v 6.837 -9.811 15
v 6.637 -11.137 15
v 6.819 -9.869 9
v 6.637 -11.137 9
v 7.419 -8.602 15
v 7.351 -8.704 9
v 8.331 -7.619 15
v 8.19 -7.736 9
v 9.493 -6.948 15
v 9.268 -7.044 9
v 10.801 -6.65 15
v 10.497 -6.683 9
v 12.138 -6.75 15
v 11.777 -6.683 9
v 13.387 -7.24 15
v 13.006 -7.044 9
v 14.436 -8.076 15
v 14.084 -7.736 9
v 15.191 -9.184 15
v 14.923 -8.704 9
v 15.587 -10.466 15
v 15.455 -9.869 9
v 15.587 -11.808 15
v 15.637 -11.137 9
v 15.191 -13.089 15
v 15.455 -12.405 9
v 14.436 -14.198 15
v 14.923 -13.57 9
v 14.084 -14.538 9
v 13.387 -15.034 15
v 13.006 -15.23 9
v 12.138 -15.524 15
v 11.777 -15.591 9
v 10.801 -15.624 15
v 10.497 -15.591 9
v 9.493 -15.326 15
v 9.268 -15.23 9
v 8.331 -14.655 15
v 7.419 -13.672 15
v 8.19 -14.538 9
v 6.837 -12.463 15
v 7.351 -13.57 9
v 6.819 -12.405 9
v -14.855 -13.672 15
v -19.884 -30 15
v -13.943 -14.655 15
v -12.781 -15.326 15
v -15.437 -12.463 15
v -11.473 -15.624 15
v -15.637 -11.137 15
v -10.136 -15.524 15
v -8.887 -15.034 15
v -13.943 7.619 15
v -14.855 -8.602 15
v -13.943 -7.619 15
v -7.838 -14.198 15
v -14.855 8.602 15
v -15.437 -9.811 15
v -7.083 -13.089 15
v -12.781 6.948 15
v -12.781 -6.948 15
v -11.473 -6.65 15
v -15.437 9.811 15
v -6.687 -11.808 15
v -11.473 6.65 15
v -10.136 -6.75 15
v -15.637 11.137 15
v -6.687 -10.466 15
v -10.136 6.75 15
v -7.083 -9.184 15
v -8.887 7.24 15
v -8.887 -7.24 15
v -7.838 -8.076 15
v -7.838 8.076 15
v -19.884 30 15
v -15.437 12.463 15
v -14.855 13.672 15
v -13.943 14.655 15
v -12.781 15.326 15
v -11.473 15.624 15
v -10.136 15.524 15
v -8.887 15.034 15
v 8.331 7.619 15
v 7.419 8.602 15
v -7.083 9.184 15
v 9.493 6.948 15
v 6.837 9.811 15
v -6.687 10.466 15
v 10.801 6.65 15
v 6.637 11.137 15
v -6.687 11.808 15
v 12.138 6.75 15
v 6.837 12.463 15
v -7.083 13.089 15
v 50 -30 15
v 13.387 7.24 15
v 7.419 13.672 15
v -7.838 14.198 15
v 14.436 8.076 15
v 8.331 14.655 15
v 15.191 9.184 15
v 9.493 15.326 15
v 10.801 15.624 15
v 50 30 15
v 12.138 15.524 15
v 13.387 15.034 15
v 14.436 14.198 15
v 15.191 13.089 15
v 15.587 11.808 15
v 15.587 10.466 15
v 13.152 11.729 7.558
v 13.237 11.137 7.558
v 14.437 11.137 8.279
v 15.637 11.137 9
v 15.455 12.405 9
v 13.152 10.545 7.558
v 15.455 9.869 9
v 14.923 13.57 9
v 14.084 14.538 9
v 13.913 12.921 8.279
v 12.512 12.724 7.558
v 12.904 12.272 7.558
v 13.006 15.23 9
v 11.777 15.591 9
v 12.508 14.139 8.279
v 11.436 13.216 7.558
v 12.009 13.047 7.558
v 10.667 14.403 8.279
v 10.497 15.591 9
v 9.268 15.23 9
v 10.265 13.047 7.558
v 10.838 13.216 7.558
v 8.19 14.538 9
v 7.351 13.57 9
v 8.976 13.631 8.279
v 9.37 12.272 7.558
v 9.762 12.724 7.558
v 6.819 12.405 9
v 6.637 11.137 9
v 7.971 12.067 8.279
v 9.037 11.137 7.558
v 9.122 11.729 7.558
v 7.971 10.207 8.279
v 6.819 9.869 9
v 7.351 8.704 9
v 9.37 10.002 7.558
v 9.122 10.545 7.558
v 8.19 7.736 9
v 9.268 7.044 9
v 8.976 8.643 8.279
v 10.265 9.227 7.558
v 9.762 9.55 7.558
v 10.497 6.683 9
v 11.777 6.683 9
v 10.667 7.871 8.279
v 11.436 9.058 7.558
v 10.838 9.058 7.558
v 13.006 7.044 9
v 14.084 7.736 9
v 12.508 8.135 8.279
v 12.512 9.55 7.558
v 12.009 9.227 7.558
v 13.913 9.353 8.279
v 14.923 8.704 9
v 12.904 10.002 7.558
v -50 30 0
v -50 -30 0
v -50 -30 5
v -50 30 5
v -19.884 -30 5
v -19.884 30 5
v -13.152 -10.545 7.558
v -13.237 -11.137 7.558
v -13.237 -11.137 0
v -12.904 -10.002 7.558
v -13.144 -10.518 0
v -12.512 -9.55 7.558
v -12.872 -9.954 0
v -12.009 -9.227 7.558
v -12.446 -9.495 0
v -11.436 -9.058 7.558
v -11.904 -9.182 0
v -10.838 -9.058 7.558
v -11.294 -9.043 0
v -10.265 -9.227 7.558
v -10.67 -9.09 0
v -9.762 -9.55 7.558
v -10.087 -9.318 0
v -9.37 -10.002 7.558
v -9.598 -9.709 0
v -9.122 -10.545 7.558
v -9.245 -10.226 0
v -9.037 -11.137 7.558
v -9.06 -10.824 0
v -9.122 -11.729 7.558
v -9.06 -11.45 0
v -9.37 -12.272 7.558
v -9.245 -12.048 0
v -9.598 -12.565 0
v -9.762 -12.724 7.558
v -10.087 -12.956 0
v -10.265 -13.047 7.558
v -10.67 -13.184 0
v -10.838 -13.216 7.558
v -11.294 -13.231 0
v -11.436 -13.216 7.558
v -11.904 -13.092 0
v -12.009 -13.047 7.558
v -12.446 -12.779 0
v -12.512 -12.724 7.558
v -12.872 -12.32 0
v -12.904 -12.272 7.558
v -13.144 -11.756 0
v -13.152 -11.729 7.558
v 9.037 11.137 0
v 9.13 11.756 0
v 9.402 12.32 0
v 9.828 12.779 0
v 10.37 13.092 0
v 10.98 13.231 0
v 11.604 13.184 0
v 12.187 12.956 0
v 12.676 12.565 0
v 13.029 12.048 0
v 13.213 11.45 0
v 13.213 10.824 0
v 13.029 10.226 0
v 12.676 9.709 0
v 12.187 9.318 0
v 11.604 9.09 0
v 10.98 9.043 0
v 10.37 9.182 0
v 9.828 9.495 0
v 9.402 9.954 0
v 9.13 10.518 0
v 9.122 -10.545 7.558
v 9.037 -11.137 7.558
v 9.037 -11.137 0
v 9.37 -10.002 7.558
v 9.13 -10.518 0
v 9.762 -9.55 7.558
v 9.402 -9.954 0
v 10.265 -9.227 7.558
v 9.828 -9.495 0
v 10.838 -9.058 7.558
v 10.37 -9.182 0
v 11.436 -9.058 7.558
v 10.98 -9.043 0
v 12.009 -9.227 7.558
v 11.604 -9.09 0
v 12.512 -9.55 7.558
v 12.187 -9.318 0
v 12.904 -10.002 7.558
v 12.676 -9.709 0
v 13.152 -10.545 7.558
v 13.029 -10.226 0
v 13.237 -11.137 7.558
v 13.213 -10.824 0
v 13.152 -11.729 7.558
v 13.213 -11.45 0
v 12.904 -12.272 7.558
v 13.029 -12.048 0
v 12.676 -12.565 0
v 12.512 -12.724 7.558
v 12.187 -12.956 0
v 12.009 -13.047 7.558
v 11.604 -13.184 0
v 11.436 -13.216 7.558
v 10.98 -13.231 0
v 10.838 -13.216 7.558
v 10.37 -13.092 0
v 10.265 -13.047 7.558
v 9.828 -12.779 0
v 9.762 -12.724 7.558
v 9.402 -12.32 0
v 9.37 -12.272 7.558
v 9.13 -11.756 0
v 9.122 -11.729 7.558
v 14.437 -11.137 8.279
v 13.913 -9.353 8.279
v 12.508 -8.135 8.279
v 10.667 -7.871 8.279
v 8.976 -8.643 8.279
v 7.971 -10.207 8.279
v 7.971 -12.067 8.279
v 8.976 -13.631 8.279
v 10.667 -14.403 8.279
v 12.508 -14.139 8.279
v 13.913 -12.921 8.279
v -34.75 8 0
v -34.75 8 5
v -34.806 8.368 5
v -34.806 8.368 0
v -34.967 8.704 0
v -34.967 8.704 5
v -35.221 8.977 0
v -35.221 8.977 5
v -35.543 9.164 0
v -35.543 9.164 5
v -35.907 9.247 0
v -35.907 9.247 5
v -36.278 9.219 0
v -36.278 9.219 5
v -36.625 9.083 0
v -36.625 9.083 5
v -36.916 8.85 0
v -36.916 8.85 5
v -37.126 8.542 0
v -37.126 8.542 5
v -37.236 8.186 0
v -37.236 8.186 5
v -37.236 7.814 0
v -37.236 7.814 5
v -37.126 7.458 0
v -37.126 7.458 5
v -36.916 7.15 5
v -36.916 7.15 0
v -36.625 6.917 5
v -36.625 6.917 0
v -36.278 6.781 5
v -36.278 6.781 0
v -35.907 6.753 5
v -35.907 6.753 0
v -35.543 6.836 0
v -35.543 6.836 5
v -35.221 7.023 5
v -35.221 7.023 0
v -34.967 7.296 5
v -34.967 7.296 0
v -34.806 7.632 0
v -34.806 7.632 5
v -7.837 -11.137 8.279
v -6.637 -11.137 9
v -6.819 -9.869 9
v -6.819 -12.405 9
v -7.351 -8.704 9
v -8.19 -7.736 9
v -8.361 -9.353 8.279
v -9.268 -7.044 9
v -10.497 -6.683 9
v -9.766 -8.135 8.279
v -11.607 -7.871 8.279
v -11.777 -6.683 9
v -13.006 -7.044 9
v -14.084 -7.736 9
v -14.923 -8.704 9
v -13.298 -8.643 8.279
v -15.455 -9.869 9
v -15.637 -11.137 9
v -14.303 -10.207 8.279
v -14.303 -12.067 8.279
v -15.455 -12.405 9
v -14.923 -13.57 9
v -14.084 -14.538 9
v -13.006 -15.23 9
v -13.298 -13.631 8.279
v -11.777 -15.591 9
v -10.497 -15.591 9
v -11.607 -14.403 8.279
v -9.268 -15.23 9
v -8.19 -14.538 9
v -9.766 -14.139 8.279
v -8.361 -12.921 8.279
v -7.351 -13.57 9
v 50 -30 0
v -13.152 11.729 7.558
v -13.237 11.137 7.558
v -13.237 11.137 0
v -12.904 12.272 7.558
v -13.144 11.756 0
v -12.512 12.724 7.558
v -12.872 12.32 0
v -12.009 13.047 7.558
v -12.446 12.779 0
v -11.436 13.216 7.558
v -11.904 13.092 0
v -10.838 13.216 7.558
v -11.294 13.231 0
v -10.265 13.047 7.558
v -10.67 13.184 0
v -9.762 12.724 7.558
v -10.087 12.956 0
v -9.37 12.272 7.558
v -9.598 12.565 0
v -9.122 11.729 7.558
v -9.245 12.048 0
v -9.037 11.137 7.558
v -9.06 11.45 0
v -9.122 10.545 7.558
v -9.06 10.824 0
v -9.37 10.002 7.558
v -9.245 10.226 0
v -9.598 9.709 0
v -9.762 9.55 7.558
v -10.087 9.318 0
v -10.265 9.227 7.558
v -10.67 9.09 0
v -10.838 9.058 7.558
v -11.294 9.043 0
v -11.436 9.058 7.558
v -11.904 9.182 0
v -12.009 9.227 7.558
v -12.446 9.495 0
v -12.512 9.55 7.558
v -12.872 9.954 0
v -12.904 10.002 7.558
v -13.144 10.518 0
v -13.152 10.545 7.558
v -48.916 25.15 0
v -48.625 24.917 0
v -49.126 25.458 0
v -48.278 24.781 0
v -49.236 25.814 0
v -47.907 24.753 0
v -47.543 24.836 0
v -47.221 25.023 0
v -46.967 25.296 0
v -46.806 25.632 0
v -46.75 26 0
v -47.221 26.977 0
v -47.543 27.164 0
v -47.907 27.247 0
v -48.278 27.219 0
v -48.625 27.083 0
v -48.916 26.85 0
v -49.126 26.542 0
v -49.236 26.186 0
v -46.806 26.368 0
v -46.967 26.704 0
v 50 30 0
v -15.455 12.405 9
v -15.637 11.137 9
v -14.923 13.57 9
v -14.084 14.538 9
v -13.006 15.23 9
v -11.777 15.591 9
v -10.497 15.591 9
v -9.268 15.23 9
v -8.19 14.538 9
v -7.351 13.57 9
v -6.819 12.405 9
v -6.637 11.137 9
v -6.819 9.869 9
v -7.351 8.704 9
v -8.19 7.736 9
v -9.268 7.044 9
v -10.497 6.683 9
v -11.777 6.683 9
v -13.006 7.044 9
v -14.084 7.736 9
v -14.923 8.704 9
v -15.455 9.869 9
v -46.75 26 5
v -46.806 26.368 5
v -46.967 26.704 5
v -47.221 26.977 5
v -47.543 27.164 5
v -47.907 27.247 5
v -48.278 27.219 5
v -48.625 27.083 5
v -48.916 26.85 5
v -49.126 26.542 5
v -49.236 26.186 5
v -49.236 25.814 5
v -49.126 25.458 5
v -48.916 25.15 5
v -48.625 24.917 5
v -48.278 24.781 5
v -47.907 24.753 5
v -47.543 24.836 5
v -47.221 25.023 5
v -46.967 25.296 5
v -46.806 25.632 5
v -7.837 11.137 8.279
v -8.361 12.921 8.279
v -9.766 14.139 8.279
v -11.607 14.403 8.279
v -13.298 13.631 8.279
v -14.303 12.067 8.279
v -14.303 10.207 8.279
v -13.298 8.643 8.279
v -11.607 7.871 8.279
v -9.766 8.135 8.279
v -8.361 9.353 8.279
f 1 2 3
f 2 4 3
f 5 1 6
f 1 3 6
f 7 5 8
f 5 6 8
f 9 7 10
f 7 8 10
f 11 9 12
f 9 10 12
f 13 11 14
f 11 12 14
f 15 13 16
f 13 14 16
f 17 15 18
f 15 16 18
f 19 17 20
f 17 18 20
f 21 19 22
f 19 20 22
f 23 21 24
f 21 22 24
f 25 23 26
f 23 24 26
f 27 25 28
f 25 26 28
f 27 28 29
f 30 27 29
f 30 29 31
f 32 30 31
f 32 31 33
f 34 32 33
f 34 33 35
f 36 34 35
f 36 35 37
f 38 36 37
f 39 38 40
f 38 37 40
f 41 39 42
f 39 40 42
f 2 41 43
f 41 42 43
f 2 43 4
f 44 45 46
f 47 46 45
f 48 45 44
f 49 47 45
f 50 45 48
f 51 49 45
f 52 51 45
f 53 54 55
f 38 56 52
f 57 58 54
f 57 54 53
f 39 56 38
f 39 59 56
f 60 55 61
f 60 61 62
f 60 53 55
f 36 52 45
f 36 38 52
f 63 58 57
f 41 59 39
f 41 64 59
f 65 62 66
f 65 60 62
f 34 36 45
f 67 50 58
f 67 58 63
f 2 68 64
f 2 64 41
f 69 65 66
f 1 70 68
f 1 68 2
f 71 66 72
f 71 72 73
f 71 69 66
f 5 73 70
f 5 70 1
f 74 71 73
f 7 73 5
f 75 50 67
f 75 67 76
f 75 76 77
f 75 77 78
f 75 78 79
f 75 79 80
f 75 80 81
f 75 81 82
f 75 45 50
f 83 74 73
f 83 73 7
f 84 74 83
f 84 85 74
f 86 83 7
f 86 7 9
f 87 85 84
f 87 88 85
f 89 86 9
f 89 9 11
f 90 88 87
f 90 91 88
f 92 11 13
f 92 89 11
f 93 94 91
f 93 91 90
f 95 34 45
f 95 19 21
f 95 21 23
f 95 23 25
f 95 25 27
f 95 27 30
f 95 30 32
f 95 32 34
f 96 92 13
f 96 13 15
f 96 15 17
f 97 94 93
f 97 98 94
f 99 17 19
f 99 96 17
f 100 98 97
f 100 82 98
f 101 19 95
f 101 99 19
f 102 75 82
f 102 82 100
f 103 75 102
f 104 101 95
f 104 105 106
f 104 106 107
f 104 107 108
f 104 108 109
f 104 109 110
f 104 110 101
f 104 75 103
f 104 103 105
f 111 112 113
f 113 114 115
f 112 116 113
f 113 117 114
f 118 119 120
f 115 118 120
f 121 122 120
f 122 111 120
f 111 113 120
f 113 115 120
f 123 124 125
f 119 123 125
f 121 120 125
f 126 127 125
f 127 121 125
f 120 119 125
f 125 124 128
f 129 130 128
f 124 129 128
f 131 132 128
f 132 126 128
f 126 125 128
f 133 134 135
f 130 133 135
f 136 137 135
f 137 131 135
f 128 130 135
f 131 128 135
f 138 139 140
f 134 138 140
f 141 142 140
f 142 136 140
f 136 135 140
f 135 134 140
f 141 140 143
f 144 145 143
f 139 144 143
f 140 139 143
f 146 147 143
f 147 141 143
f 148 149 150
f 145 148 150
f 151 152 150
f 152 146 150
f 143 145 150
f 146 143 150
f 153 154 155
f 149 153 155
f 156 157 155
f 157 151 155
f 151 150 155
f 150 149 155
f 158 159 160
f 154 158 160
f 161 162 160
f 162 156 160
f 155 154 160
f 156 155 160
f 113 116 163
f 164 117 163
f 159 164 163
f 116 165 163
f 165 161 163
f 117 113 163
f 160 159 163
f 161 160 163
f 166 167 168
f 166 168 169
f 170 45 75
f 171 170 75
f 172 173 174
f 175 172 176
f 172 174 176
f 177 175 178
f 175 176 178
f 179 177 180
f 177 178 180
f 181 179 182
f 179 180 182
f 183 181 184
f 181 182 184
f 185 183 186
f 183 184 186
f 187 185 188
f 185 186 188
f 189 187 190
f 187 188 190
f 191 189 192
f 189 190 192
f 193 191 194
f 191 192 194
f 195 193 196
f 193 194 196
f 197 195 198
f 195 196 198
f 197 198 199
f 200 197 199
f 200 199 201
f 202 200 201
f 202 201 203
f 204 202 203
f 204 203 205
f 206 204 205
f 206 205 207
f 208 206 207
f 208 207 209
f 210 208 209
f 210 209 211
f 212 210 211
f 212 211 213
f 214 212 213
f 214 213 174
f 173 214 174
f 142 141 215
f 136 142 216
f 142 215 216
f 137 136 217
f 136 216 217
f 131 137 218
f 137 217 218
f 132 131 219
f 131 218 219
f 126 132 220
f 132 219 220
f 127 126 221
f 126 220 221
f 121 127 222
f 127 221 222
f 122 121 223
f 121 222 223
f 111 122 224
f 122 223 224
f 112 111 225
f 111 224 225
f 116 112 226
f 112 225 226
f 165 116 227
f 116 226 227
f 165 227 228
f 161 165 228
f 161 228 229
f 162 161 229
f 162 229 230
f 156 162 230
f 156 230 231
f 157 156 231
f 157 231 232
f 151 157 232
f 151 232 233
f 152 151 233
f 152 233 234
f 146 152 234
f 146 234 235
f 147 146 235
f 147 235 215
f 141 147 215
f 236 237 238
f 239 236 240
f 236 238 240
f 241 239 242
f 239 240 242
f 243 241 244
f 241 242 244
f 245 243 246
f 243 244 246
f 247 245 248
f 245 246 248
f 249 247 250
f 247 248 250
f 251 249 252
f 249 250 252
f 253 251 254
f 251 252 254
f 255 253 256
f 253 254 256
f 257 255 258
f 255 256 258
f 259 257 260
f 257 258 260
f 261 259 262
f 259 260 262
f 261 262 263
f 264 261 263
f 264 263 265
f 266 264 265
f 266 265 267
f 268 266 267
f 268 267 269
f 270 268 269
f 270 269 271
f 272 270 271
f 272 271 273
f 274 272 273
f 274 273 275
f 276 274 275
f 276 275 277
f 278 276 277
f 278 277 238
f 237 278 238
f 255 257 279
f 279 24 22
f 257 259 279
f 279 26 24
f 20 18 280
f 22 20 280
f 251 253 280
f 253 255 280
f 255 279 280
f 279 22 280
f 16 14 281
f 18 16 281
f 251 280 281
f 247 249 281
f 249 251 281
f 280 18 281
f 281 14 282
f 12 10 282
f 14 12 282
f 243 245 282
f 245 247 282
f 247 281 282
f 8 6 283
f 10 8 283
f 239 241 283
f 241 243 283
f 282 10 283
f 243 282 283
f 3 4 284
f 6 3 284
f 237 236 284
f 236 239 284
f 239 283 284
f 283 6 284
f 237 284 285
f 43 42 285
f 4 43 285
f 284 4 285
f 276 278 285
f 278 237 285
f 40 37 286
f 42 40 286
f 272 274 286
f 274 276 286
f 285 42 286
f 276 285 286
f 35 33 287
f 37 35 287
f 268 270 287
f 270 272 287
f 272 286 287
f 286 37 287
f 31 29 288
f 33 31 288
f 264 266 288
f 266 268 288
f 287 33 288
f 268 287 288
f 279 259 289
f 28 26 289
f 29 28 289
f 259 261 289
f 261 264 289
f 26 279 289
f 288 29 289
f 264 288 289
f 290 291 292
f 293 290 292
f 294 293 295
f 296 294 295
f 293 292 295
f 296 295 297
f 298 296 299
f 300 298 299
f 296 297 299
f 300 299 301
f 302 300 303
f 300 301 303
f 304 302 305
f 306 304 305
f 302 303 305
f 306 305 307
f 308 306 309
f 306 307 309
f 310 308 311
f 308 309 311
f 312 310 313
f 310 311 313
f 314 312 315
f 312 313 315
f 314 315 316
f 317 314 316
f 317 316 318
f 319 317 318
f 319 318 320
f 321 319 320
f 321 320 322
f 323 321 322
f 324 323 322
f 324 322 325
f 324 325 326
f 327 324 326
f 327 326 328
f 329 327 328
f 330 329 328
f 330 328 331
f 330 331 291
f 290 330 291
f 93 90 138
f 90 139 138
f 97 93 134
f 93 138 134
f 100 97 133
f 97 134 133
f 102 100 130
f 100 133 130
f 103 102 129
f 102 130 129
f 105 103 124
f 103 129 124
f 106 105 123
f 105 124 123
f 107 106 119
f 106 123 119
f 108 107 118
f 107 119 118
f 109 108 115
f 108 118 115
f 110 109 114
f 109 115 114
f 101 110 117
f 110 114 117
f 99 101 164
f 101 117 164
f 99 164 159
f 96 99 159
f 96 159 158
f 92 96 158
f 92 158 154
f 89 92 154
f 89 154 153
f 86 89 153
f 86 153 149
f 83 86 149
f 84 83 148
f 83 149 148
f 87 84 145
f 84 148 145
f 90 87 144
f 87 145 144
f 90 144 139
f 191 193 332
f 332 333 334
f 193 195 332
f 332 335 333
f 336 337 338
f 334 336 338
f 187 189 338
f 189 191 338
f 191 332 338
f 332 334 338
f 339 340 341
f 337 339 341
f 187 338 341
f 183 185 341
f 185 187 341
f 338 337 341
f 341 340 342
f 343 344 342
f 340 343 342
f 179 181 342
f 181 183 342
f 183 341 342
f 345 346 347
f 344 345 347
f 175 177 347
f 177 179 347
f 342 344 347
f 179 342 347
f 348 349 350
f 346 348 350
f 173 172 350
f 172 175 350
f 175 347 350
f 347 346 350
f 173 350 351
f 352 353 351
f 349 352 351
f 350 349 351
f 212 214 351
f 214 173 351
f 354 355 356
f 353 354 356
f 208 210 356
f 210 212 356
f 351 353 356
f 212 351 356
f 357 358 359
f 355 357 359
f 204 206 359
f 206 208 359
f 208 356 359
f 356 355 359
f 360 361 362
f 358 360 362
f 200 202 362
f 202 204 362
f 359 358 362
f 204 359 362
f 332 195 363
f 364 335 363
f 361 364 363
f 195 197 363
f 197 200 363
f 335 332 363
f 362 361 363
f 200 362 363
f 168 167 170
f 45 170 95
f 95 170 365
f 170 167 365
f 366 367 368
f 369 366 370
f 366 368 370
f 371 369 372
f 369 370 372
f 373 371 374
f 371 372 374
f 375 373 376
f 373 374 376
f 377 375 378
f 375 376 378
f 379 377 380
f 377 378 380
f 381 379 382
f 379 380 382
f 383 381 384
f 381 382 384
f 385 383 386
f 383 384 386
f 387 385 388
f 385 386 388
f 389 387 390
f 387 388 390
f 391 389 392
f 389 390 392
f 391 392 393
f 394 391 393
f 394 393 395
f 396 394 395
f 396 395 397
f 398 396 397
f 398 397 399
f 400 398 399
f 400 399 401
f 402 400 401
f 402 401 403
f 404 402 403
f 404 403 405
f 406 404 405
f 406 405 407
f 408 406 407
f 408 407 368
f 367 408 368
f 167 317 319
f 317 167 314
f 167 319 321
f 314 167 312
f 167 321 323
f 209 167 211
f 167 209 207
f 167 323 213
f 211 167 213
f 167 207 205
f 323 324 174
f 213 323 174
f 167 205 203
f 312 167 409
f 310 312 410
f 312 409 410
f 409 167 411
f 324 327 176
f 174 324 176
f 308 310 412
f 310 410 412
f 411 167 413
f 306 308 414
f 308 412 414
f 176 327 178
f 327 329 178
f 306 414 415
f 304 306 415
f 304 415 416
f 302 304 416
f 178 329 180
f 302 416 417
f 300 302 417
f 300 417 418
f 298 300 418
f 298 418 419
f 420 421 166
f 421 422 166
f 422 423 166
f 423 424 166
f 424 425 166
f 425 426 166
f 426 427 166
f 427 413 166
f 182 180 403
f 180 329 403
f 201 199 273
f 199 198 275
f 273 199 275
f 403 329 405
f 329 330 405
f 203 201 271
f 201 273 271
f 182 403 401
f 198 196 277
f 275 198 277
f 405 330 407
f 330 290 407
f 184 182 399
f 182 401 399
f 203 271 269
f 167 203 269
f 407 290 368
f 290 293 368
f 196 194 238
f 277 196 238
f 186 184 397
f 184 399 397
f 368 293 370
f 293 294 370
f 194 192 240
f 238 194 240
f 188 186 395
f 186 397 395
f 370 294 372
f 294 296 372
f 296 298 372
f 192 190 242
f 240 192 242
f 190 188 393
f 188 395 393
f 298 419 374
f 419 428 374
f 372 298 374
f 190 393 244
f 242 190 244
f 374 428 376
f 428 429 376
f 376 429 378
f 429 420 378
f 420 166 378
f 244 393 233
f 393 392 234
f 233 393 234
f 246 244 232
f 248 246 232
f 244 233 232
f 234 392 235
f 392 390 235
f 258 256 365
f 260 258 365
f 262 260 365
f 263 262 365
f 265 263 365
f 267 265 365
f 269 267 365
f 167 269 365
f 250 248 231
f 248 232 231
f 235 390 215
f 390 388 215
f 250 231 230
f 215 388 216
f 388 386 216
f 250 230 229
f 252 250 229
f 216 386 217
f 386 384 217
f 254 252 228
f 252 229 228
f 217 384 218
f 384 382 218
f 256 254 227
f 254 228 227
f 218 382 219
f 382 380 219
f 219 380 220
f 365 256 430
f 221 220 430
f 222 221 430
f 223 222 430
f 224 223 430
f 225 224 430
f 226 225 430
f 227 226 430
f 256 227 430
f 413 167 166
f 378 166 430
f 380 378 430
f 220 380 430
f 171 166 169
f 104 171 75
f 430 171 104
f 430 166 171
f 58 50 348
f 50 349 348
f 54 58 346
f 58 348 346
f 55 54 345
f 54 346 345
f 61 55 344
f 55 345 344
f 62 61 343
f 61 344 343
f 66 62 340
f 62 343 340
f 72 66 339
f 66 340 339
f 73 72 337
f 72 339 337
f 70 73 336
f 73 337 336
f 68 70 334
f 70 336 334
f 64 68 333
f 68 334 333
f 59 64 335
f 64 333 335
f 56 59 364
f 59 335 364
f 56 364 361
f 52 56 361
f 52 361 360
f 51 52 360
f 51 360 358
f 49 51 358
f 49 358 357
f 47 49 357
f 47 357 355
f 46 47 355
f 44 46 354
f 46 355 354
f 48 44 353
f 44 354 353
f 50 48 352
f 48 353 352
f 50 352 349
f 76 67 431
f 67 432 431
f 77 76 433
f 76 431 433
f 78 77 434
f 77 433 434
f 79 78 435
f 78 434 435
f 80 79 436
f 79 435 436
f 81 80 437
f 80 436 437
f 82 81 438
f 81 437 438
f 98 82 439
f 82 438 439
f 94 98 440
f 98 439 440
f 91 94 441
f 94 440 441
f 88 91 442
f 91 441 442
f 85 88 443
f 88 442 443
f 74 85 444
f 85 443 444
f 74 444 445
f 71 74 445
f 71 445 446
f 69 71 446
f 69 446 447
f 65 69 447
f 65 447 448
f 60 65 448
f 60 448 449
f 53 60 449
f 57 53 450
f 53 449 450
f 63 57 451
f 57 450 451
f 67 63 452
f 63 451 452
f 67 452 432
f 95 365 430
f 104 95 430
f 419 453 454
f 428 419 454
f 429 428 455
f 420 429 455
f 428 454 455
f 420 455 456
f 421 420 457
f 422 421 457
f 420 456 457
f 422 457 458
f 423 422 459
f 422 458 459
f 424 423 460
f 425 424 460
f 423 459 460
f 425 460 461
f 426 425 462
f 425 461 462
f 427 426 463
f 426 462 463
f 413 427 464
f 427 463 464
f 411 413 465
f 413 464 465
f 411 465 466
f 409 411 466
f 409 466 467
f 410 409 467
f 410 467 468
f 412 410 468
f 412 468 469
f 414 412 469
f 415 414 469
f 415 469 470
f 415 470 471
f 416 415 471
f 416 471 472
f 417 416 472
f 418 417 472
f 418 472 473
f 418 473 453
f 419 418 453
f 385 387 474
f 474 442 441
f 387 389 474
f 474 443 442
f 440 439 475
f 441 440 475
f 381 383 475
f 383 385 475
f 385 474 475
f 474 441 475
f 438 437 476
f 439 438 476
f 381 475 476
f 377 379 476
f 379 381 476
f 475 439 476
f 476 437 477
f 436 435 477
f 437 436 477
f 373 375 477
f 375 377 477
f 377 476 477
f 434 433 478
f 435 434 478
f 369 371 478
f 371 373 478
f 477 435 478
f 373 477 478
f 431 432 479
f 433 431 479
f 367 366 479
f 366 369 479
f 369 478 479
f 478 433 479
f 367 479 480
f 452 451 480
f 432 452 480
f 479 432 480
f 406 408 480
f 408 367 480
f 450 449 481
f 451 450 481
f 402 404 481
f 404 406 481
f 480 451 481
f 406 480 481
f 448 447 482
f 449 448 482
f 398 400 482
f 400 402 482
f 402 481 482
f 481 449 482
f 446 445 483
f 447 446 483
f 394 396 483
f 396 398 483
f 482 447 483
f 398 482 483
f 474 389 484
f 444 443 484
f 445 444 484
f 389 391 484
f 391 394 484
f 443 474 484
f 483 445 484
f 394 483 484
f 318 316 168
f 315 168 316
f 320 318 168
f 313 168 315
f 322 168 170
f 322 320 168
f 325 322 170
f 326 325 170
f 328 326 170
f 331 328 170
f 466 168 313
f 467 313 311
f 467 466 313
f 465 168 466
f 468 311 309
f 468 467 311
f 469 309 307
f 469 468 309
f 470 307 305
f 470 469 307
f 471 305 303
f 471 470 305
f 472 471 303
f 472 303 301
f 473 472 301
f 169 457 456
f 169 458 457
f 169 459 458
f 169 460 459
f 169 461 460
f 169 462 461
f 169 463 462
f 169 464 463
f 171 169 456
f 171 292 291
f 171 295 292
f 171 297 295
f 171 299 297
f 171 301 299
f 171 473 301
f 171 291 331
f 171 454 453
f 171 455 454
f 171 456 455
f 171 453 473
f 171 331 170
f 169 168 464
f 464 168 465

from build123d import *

# Parameters (mm, degrees)
SKETCH_1_W                = 100
SKETCH_1_H                = 60
EXTRUDE_1_DEPTH           = 15
HOLE_WIZARD_9_0_9_1_D     = 9
HOLE_WIZARD_9_0_9_1_DEPTH = 6
HOLE_WIZARD_9_0_9_1_TIP   = 2.703872786
HOLE_WIZARD_M5_2_D        = 4.2
SKETCH_8_W                = 30.11564459
SKETCH_8_H                = 60
CUT_EXTRUDE_2_DEPTH       = 10
HOLE_WIZARD_M3_1_D        = 2.5


with BuildPart() as part:
    # 스케치1 → 보스-돌출1 (new body)
    with BuildSketch(Plane.XY):
        Rectangle(SKETCH_1_W, SKETCH_1_H)
    extrude(amount=EXTRUDE_1_DEPTH)

    # Ø9.0 (9) 지름 구멍1
    with Locations(Plane(origin=(-11.136931804, 11.136931804, 15), x_dir=(1, 0, 0), z_dir=(0, 0, 1))):
        with Locations((0, 0), (22.273863608, 0), (0, -22.273863608), (22.273863608, -22.273863608)):
            Hole(HOLE_WIZARD_9_0_9_1_D / 2, depth=HOLE_WIZARD_9_0_9_1_DEPTH)
            with Locations((0, 0, -(HOLE_WIZARD_9_0_9_1_DEPTH + HOLE_WIZARD_9_0_9_1_TIP / 2))):  # 118° drill point
                Cone(0, HOLE_WIZARD_9_0_9_1_D / 2, HOLE_WIZARD_9_0_9_1_TIP, mode=Mode.SUBTRACT)

    # M5 나사 구멍2 (through all)
    with Locations(Plane.XY.offset(15)):
        with Locations((-11.136931804, 11.136931804), (11.136931804, 11.136931804), (11.136931804, -11.136931804), (-11.136931804, -11.136931804)):
            Hole(HOLE_WIZARD_M5_2_D / 2)

    # 스케치8 → 컷-돌출2 (cut)
    with BuildSketch(Plane.XY.offset(15)):
        with Locations((-34.942177705, 0)):
            Rectangle(SKETCH_8_W, SKETCH_8_H)
    extrude(amount=-CUT_EXTRUDE_2_DEPTH, mode=Mode.SUBTRACT)

    # M3 나사 구멍1 (through all)
    with Locations(Plane(origin=(-36, 8, 0), x_dir=(-1, 0, 0), z_dir=(0, 0, -1))):
        with Locations((0, 0), (12, 18)):
            Hole(HOLE_WIZARD_M3_1_D / 2)


solid = part.part
